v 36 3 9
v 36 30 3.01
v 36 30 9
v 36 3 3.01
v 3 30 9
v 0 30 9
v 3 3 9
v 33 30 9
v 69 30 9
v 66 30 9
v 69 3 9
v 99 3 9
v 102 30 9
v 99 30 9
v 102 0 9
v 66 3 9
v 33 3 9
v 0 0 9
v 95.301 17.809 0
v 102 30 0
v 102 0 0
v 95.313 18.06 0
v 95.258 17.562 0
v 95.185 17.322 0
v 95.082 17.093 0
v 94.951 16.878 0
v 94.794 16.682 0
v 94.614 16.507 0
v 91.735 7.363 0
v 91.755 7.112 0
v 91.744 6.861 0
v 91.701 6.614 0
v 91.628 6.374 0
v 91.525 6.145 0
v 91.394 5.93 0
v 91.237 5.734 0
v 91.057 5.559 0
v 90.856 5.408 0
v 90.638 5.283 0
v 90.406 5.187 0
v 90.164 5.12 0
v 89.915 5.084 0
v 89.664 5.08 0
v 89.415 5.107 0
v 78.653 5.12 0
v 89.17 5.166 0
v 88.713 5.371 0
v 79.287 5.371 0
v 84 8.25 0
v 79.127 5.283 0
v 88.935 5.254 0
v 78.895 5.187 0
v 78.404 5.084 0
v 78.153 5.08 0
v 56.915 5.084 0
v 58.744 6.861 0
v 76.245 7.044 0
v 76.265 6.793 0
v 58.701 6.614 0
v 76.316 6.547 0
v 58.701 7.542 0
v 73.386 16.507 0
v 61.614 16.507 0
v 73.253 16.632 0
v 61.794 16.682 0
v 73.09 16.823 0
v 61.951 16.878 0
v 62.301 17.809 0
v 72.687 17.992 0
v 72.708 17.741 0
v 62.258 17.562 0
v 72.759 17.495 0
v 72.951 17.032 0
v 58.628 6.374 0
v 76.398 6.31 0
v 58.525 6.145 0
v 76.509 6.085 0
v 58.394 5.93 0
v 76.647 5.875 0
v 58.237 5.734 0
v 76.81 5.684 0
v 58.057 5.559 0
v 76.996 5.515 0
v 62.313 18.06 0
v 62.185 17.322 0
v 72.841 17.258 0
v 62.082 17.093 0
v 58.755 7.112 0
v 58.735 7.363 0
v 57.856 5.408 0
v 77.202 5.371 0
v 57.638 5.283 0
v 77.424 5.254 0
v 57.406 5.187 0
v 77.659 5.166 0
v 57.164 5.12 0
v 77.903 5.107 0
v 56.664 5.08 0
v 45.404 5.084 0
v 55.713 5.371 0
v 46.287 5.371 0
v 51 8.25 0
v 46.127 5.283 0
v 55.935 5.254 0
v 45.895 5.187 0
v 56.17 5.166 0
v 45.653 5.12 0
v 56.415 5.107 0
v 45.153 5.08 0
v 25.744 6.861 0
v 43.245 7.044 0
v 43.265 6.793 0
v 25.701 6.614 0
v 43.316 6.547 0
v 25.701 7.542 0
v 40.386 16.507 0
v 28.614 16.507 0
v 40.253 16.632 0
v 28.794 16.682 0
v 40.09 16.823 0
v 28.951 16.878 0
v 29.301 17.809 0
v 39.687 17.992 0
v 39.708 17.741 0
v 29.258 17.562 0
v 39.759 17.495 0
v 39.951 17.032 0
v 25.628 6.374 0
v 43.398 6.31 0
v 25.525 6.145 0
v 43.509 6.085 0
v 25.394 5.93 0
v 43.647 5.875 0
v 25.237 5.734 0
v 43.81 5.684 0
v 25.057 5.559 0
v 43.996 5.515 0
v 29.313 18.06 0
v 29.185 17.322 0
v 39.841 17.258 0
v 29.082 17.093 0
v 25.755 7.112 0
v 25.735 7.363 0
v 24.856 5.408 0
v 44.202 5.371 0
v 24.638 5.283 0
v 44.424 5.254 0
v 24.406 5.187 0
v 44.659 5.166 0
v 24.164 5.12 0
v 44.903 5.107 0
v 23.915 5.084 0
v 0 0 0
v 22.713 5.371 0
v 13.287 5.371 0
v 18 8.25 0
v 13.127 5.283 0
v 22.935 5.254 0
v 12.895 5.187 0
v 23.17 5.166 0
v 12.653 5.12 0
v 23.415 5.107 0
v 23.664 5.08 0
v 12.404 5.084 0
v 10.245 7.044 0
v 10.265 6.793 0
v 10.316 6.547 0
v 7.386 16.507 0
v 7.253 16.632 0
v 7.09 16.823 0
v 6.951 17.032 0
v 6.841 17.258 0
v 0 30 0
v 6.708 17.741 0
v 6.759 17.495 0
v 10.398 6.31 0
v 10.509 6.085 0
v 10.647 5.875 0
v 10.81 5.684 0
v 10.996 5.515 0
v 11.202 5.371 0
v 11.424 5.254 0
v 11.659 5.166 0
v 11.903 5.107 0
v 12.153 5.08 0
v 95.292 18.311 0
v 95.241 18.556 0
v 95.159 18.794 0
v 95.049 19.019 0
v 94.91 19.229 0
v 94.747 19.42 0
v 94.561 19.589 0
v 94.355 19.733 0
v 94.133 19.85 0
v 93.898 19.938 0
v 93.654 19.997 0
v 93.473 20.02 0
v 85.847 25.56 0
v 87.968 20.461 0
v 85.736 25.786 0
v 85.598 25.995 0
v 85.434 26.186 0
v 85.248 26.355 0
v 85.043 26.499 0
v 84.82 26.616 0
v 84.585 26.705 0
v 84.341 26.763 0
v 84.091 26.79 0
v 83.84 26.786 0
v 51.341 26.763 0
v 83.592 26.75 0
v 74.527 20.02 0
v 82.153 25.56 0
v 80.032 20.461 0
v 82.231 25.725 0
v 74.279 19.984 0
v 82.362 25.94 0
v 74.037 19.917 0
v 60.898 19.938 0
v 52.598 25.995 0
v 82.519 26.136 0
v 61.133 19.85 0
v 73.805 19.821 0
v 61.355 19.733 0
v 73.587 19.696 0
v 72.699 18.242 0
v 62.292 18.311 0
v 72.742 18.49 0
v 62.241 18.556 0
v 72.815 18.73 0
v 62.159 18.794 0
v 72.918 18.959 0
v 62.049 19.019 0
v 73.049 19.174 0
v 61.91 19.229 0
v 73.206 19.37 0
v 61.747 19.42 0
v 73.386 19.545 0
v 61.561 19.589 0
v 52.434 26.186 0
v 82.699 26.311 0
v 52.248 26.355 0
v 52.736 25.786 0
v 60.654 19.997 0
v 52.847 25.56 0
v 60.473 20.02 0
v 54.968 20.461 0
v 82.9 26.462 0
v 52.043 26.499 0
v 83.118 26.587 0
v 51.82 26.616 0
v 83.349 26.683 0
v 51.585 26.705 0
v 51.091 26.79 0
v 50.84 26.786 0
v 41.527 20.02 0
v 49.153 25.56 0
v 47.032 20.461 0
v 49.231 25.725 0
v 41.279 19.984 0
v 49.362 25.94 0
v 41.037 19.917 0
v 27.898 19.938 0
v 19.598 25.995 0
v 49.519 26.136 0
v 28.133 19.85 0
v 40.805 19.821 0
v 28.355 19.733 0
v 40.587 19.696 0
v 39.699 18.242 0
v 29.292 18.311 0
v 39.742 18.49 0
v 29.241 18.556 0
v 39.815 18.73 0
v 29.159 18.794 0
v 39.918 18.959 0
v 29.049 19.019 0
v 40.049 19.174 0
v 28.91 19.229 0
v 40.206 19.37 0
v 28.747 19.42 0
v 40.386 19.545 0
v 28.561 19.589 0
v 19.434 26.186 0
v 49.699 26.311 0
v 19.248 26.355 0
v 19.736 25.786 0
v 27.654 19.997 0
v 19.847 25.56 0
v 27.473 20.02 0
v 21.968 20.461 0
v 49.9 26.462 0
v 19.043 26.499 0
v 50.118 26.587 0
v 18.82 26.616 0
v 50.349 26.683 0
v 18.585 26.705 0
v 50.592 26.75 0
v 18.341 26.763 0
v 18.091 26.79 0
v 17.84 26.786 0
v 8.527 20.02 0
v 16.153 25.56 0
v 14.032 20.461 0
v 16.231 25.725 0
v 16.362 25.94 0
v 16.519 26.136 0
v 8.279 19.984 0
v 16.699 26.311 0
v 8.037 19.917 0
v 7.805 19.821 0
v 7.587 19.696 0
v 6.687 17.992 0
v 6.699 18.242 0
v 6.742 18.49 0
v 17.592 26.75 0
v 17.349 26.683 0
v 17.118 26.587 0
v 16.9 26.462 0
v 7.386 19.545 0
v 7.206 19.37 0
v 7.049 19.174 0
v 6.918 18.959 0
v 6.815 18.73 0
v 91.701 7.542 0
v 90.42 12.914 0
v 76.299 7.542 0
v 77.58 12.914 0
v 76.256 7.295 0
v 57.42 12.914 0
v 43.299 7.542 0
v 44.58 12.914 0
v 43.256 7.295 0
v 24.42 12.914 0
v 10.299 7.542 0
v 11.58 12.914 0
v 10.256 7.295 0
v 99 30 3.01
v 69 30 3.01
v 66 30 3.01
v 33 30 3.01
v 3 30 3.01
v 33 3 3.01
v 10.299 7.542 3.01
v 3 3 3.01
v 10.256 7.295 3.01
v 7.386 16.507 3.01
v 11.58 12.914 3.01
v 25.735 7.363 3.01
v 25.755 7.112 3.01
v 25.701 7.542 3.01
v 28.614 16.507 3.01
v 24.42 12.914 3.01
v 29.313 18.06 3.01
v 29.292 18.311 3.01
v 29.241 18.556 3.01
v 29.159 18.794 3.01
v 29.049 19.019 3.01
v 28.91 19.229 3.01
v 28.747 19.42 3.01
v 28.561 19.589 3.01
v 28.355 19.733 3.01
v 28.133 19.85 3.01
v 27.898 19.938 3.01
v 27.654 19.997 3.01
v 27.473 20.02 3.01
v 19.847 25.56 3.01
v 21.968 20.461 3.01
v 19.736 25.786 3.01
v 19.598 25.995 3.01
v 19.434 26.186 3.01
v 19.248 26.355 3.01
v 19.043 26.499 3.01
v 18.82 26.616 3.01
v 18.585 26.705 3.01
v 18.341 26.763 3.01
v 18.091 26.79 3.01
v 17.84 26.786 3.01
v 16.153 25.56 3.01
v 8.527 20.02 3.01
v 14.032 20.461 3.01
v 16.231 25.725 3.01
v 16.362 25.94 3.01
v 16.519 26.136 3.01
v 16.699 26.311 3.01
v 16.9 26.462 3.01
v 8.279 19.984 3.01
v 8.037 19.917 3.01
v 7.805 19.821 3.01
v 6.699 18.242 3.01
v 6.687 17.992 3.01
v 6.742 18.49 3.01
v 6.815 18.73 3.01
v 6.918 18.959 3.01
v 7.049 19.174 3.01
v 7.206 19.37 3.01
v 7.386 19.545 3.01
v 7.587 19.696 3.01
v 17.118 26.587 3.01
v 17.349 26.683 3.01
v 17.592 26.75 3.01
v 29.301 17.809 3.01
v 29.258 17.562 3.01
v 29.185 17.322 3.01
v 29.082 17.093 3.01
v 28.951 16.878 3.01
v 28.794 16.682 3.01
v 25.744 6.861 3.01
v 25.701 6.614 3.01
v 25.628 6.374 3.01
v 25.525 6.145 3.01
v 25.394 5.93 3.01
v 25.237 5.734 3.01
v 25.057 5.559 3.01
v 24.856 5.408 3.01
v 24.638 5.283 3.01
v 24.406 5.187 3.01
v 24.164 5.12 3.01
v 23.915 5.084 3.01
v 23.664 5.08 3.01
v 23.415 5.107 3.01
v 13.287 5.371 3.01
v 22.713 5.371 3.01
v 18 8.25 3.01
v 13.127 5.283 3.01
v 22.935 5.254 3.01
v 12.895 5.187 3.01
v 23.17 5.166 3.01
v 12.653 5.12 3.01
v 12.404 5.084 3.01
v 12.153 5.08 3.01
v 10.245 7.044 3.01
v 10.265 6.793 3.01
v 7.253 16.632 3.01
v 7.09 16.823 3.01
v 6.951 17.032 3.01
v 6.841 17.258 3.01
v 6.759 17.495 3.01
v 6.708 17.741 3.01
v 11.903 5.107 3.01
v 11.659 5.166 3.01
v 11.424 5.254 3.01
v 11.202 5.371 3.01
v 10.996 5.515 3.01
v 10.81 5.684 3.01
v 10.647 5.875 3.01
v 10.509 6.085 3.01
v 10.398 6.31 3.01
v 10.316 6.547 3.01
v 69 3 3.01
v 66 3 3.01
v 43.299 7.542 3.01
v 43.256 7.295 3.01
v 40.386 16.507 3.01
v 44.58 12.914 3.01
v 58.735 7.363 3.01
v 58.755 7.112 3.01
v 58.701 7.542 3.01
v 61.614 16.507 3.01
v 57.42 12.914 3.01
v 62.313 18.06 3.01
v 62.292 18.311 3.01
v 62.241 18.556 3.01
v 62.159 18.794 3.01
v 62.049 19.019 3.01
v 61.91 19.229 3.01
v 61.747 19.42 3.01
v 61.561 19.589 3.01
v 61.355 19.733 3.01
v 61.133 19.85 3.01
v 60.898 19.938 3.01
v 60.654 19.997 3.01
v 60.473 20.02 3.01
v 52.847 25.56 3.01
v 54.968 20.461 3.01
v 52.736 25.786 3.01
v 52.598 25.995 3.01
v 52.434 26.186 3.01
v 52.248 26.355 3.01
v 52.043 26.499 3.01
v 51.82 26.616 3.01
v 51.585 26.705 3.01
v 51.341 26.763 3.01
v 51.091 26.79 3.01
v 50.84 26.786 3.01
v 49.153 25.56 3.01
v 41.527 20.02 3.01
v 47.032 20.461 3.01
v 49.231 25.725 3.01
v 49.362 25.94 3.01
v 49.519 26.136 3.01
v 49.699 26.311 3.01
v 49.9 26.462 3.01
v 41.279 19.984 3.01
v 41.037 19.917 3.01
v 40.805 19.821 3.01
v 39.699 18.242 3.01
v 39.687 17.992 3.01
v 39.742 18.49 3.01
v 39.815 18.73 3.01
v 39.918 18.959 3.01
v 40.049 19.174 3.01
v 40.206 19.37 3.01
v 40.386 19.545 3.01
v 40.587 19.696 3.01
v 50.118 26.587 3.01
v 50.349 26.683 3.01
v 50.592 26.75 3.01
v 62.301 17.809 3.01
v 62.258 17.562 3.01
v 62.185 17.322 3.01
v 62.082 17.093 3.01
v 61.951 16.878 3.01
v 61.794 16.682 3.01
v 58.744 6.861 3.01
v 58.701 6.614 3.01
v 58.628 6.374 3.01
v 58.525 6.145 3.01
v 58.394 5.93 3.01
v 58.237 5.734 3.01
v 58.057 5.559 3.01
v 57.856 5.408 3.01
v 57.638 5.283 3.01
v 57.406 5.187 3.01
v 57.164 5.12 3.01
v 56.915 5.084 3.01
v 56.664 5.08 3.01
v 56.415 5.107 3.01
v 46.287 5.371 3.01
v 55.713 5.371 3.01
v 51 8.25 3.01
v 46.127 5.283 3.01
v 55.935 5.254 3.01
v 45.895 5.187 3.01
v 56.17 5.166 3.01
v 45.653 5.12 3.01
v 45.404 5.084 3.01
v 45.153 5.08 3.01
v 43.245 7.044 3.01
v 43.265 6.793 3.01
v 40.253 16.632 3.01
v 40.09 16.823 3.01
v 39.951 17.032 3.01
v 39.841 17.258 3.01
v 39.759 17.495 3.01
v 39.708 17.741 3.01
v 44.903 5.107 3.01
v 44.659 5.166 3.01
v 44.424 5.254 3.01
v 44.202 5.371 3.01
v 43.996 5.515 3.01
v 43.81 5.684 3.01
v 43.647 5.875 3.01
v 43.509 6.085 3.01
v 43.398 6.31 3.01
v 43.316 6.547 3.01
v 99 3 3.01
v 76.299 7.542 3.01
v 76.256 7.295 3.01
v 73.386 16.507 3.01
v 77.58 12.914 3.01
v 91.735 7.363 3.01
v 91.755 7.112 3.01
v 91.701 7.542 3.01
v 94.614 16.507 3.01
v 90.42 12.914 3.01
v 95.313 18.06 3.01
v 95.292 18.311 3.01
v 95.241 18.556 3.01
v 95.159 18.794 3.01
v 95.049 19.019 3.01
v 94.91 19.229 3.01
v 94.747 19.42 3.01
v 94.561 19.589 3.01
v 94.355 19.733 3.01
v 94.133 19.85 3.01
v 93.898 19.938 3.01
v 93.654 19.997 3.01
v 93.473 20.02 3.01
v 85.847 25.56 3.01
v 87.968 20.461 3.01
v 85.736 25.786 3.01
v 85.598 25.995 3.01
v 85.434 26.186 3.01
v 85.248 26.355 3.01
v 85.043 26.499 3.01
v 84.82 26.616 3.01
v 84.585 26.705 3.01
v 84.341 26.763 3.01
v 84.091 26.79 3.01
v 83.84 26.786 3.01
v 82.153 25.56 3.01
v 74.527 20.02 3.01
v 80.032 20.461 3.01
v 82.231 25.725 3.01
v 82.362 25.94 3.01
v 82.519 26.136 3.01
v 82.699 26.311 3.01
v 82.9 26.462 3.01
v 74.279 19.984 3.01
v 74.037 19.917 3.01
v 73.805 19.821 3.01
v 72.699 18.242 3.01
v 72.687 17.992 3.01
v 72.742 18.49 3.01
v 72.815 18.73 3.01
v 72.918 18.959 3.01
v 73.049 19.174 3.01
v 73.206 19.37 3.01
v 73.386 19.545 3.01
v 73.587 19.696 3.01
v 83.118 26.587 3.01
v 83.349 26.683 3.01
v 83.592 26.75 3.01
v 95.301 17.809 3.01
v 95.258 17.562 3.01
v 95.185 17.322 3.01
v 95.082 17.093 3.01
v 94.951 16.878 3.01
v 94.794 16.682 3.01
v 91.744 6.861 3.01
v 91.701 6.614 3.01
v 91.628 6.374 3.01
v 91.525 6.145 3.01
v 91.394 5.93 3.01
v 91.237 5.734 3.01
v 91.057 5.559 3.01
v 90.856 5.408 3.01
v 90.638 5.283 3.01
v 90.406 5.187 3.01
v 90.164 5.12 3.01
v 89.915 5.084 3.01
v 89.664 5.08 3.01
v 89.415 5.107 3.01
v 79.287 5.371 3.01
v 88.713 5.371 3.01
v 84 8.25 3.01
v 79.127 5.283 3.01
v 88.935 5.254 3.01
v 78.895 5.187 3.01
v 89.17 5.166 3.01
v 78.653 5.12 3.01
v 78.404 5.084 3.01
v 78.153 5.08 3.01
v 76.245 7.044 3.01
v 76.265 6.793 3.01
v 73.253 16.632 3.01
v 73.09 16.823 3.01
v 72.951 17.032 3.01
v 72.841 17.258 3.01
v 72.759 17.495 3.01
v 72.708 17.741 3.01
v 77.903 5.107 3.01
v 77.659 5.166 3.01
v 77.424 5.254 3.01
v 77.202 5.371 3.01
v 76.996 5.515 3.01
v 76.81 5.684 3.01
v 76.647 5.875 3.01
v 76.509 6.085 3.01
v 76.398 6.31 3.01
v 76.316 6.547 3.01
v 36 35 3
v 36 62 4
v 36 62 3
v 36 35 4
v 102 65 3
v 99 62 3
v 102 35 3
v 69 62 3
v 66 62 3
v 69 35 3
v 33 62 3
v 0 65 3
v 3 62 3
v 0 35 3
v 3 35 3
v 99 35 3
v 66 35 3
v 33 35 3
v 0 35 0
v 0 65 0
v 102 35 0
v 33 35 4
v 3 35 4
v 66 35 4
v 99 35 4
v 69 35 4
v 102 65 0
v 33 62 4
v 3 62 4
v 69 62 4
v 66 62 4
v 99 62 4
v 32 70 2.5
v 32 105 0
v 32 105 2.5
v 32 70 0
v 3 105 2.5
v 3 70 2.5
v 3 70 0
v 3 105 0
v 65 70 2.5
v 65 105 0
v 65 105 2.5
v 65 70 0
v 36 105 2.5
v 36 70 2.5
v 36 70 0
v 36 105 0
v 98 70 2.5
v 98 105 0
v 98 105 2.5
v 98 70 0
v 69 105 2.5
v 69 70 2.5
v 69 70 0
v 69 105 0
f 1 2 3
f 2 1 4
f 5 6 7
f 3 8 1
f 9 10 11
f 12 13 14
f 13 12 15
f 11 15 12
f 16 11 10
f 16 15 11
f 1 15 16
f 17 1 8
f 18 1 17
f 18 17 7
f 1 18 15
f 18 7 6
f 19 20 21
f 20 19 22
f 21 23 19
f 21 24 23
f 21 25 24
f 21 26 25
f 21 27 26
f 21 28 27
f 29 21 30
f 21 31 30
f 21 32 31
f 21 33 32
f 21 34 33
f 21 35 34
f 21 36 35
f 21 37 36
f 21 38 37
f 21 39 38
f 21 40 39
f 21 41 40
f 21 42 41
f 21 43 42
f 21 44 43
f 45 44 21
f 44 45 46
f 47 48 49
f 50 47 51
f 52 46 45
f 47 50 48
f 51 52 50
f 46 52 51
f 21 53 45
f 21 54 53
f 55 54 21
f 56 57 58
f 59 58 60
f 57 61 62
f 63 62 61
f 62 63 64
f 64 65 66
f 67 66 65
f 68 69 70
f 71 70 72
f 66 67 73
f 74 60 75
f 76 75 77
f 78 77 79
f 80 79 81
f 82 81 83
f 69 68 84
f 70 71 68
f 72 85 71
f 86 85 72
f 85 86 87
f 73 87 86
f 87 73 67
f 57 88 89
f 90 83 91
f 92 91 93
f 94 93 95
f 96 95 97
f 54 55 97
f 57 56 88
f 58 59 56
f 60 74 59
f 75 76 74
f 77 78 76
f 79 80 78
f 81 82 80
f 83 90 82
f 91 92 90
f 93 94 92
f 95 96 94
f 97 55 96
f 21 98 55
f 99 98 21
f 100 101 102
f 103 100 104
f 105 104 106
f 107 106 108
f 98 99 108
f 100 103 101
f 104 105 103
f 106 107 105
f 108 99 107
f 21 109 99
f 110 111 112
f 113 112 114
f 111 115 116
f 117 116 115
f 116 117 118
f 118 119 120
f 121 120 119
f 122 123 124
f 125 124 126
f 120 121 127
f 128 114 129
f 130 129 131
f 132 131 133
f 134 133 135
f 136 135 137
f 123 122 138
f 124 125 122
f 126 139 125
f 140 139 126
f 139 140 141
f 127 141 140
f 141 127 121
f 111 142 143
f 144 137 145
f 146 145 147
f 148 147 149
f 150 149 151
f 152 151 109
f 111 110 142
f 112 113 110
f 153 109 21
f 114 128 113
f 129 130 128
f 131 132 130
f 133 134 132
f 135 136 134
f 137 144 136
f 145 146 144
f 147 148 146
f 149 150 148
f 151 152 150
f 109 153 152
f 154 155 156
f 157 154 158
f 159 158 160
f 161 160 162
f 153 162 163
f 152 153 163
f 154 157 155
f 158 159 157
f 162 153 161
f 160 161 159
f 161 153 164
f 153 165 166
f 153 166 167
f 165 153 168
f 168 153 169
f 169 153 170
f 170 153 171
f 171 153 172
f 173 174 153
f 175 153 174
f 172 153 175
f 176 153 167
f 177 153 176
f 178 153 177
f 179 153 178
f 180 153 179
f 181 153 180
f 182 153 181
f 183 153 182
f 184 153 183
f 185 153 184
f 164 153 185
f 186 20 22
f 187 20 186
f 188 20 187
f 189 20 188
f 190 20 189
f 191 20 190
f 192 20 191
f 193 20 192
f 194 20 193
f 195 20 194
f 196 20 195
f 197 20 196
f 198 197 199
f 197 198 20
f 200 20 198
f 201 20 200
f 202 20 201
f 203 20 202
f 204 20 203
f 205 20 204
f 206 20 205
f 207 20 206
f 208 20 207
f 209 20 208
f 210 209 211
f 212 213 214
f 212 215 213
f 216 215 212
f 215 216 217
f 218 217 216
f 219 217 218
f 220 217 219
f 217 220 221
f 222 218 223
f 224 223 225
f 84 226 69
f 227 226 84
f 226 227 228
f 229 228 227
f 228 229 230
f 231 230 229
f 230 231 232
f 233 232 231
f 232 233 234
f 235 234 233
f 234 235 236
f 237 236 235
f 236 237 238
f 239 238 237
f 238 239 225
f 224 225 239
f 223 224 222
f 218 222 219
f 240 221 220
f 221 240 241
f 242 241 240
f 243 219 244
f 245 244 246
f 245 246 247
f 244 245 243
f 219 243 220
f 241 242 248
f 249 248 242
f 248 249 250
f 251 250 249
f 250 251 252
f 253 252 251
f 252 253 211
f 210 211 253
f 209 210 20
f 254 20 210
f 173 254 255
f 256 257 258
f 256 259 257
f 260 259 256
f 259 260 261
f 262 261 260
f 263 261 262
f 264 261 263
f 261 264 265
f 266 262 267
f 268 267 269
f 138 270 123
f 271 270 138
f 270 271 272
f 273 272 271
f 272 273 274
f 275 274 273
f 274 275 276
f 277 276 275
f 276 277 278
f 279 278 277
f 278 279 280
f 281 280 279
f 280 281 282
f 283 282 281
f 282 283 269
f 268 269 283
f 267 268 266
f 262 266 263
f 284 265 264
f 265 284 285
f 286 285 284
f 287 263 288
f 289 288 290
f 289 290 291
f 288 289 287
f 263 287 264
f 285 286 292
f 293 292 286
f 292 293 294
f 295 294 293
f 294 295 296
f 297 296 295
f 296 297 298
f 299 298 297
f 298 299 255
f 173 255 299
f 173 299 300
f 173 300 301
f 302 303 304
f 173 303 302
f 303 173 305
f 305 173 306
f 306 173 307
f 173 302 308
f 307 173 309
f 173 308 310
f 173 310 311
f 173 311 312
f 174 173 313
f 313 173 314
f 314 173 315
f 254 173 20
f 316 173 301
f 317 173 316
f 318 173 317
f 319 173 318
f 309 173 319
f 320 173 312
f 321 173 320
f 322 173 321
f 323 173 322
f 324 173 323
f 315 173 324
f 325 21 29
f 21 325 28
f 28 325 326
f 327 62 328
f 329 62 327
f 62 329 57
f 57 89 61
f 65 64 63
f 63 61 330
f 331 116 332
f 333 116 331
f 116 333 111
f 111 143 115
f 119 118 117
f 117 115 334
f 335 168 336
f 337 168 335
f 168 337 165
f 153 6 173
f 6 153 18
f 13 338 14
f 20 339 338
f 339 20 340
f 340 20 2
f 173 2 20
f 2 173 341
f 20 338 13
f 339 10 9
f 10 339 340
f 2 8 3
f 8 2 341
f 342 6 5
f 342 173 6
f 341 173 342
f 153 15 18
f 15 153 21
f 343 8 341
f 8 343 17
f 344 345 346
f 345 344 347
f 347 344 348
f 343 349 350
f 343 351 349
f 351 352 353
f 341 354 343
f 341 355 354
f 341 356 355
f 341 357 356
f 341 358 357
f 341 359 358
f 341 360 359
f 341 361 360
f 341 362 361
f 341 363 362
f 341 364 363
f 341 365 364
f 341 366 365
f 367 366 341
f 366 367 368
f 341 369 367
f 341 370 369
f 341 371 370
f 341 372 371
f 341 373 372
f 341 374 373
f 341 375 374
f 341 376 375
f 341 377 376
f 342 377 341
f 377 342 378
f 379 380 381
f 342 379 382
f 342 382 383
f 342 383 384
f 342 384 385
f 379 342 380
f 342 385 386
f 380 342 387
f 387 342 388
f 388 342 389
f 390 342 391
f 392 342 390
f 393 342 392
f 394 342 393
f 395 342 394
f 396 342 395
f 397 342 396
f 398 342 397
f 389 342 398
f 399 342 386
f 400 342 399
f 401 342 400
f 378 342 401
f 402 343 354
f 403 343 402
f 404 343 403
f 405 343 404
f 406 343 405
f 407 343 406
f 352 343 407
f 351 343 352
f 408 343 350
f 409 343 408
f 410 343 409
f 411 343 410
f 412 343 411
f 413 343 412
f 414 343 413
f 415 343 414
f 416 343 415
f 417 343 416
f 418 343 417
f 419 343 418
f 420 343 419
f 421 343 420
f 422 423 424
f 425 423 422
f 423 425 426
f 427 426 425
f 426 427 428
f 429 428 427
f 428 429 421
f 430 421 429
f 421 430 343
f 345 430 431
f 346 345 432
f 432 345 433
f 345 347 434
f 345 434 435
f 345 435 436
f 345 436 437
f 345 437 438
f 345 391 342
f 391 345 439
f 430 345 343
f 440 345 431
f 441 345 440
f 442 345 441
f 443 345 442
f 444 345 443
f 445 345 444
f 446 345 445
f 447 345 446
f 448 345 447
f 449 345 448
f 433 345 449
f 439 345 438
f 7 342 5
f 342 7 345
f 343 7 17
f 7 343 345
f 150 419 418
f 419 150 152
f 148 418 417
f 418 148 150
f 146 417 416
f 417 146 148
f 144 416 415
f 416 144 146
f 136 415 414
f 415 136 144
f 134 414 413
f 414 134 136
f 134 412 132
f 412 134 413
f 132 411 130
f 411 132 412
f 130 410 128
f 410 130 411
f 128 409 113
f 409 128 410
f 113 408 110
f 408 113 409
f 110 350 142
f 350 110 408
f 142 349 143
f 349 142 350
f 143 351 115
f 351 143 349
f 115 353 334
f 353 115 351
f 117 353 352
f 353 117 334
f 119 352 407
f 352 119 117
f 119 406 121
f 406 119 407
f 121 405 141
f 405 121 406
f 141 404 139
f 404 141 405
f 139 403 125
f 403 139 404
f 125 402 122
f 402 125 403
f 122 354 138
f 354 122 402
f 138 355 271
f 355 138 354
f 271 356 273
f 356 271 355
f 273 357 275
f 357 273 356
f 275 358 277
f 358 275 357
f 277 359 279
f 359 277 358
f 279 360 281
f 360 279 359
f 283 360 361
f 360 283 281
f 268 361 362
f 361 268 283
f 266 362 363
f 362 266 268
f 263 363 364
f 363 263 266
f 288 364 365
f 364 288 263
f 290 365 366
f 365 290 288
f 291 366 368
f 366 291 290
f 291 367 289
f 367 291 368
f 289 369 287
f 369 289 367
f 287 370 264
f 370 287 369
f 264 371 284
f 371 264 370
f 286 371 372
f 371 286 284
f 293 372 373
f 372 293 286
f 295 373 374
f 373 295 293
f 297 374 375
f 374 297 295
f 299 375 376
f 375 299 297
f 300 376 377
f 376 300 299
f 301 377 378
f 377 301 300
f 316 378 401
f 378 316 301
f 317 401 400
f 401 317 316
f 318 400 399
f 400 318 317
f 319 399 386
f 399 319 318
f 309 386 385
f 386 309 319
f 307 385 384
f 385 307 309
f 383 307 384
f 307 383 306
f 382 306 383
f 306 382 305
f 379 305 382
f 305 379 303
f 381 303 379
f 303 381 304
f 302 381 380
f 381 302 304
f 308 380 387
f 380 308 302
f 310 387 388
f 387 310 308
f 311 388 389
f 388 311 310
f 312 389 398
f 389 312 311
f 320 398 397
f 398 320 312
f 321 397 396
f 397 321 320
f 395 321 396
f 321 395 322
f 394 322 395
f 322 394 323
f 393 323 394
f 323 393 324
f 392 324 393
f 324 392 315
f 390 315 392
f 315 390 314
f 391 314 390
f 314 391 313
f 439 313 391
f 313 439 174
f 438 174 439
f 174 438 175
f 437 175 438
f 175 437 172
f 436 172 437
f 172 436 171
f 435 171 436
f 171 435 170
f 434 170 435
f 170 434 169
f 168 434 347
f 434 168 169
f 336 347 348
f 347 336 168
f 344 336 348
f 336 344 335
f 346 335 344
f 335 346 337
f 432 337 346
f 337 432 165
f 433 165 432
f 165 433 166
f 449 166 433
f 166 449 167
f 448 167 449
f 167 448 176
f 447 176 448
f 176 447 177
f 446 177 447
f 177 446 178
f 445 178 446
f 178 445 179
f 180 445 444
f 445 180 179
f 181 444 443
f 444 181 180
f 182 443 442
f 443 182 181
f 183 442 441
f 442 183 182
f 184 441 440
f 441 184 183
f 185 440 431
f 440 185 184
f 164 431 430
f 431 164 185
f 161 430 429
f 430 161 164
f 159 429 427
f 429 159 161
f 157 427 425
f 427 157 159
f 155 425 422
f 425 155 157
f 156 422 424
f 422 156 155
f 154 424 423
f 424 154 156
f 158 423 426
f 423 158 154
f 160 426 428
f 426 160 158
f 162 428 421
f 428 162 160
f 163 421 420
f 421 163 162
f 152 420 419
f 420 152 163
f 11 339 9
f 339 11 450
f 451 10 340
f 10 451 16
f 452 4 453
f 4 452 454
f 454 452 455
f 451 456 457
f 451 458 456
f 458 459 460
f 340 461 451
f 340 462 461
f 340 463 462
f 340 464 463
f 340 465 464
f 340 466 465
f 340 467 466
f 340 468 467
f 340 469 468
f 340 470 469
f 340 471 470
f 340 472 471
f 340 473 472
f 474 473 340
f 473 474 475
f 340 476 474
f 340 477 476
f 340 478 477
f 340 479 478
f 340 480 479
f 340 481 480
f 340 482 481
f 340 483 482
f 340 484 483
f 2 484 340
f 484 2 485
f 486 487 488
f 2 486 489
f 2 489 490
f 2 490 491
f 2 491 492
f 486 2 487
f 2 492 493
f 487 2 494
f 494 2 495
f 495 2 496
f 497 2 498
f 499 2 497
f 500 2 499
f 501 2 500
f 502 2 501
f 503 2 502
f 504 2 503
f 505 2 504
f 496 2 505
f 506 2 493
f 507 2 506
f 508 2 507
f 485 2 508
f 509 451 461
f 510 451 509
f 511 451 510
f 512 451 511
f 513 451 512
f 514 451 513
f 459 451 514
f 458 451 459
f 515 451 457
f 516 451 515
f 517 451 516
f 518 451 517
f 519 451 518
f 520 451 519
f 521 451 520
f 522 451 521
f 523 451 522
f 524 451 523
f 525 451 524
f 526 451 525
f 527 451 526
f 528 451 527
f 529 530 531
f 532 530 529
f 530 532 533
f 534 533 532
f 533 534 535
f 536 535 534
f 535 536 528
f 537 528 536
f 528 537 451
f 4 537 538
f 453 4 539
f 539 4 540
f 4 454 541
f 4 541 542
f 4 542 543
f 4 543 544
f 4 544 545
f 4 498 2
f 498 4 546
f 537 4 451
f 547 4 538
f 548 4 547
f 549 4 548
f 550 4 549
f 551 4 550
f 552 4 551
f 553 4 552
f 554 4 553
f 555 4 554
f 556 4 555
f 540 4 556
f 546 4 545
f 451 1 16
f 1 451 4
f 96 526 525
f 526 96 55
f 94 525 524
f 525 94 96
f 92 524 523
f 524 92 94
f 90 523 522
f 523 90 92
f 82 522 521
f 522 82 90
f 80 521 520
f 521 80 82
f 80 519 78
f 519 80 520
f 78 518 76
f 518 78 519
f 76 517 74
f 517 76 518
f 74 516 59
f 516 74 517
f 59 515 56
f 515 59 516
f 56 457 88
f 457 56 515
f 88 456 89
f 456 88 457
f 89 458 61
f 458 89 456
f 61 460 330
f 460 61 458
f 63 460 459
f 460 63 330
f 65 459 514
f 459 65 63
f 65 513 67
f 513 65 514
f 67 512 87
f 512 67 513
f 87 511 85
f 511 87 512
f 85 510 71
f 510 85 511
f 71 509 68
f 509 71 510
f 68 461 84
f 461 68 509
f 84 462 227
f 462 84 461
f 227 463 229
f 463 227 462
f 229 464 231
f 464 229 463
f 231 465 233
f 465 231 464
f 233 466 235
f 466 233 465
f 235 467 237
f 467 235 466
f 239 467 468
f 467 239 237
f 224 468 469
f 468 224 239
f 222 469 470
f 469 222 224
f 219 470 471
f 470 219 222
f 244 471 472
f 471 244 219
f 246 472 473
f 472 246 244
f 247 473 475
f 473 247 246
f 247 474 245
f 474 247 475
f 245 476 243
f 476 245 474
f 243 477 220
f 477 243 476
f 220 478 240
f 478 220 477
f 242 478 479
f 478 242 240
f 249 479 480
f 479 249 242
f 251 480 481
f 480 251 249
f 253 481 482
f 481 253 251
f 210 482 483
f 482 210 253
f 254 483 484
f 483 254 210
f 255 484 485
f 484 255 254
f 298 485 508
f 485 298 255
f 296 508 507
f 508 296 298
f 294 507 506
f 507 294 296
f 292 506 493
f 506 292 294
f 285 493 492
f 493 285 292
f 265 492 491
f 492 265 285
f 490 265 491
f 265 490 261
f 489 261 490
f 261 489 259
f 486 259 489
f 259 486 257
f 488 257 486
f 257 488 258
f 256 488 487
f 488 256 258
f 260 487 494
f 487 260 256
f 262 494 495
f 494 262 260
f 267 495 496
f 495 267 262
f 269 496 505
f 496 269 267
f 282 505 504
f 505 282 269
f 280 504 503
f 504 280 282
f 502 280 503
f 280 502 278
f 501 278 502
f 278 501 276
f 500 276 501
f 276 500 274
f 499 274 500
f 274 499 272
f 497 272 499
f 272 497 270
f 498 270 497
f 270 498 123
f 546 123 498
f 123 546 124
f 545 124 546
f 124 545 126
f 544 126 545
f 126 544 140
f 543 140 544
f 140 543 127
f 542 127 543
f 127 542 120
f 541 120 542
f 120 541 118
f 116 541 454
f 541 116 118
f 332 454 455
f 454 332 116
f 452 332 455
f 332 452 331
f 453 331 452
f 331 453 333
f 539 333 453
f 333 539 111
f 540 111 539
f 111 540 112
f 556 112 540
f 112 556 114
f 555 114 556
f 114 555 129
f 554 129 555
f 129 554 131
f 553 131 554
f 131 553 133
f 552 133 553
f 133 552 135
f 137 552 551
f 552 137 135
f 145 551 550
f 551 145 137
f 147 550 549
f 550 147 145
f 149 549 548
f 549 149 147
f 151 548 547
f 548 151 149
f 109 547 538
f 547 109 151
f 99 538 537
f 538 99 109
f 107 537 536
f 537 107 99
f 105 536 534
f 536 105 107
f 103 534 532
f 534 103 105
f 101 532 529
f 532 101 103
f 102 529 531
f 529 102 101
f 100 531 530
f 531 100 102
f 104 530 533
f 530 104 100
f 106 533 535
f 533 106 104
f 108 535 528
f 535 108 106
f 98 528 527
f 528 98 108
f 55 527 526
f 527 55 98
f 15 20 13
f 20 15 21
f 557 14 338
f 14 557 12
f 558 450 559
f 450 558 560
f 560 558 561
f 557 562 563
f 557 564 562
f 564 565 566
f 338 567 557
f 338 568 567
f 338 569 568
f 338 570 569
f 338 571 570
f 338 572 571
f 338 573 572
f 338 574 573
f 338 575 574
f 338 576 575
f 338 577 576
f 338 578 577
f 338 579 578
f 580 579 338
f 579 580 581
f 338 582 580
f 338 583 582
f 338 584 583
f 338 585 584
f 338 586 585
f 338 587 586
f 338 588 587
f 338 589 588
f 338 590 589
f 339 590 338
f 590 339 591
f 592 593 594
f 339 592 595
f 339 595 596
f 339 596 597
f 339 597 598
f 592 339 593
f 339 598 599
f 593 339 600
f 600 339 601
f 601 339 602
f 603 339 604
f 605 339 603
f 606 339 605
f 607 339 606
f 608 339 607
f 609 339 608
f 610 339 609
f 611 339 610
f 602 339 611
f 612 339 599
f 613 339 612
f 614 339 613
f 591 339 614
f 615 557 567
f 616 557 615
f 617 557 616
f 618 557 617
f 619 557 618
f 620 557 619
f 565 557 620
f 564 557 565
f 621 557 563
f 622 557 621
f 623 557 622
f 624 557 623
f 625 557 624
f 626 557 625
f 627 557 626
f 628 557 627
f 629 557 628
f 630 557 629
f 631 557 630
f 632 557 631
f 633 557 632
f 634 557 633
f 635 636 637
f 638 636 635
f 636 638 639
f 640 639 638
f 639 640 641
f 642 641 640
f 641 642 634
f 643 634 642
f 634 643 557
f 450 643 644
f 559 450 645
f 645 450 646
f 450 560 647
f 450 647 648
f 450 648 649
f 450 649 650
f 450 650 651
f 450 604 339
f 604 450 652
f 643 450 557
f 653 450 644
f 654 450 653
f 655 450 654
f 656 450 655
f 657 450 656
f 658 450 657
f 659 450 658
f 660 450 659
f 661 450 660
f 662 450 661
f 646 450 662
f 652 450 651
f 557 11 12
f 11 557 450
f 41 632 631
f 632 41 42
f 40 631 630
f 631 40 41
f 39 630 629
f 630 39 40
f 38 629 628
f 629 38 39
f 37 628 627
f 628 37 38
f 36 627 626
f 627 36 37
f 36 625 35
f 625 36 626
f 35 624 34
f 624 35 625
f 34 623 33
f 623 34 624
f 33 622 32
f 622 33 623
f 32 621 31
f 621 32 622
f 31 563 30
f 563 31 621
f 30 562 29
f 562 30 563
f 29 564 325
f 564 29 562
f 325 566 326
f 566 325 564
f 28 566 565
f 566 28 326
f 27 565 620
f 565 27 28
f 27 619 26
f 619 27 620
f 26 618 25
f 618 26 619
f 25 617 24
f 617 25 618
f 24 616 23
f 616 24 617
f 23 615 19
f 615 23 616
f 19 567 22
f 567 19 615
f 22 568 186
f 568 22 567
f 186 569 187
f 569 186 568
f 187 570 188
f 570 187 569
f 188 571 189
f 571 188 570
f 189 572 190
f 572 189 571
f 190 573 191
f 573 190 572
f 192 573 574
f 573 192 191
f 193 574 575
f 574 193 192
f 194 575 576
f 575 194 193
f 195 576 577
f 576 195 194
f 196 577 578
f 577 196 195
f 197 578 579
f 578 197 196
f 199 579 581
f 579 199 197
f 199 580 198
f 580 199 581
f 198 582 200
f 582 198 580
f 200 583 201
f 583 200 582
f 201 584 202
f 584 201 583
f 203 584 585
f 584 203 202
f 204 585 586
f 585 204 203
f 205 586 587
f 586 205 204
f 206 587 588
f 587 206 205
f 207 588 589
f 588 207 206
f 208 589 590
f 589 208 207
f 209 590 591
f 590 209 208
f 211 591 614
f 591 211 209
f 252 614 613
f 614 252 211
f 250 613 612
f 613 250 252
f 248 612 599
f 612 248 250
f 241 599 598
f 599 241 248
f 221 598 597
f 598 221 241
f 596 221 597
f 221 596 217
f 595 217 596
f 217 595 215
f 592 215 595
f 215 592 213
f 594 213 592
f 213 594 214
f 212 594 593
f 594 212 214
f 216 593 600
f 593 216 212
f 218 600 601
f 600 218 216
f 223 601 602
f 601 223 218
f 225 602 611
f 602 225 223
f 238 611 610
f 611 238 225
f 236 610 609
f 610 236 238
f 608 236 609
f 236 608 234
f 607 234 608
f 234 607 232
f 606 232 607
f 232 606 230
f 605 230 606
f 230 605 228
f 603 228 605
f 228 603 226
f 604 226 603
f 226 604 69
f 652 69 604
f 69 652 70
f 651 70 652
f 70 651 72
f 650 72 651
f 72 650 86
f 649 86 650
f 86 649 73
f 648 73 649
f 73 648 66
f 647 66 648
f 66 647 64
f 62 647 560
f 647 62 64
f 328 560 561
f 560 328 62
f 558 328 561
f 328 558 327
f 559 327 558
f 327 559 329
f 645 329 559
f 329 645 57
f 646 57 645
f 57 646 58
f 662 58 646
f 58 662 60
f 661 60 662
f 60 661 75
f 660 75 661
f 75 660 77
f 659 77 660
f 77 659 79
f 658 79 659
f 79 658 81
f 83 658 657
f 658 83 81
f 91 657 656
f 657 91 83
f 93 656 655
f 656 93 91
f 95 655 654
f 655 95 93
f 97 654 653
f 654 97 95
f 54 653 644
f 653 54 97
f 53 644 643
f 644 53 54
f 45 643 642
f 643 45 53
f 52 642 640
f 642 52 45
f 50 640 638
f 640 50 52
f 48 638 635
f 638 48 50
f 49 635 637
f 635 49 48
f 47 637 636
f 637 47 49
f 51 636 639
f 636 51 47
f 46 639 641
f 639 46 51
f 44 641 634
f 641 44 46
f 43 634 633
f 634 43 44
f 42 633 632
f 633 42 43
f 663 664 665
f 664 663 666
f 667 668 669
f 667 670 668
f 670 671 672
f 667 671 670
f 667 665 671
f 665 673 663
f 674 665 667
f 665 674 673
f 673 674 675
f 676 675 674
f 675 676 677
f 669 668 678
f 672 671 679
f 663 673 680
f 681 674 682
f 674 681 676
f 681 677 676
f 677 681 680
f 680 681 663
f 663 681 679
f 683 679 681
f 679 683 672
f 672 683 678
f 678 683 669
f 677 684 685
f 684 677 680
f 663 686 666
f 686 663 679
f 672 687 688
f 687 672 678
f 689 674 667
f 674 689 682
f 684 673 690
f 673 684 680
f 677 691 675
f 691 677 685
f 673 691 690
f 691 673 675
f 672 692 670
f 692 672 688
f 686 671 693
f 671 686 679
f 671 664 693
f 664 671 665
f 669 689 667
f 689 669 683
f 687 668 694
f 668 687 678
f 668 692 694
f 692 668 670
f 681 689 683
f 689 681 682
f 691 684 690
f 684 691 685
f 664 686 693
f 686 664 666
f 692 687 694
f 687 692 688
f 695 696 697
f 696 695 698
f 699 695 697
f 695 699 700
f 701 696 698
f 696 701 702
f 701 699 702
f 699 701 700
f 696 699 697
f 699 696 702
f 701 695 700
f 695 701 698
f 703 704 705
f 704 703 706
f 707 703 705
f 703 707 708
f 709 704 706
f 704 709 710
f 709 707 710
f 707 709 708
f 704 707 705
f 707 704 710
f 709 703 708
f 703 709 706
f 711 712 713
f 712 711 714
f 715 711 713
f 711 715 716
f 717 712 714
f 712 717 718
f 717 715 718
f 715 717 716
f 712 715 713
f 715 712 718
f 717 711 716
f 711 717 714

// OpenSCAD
// ---------------------------------------------------------------------------
//  Star Activity Tracker
//
//  Model page: https://www.printables.com/model/1854921-star-activity-tracker
//
//  All dimensions are in millimetres.
//
// ---------------------------------------------------------------------------

// ---------------------------------------------------------------------------
//  Quality
// ---------------------------------------------------------------------------

$fn = 50;

// ---------------------------------------------------------------------------
//  Parameters
// ---------------------------------------------------------------------------

// Token
token_width = 30;   // square footprint of a token window
token_height = 35;  // token length; taller than the window so it can be gripped
token_depth = 6;    // window cavity depth
inset = 1;          // clearance shaved from token and cavity edges

// Case
thickness = 3;      // window floor and rear panel thickness
spacing = 3;        // gap between windows, also the width of a window's frame wall
tokens = 3;         // number of windows in the case

// Layout
eps = 0.01;          // fudge factor for clean boolean cuts
panel_clearance = 5; // gap between the window row and the rear panel
case_or_token = "case";

// Window star cut-out
star_points = 5;
star_corner_radius = 2; // softens the star's points
star_cut_height = 100;  // tall enough to punch through anything it meets

// ---------------------------------------------------------------------------
//  Derived dimensions
// ---------------------------------------------------------------------------

column_pitch = token_width + spacing;
case_length = tokens * column_pitch + spacing; // window row and panel width

// ---------------------------------------------------------------------------
//  Star
// ---------------------------------------------------------------------------

// An n-pointed star with rounded corners, extruded to height z
module rounded_star(x = 50, y = 50, z = 5, points = 5, rounding = 1, inner_ratio = 0.45) {
    linear_extrude(height = z)
        offset(r = rounding)
            offset(delta = -rounding)
                polygon([
                    for (i = [0 : 2 * points - 1])
                        let (
                            angle = 90 + i * 180 / points,
                            radius = (i % 2 == 0) ? 1 : inner_ratio
                        )
                            [
                                (x / 2) * radius * cos(angle),
                                (y / 2) * radius * sin(angle)
                            ]
                ]);
}

// ---------------------------------------------------------------------------
//  Token window
// ---------------------------------------------------------------------------

module window(x_offset) {
    translate([x_offset, 0, 0])
        difference() {
            cube([token_width + 2 * spacing, token_width, token_depth + thickness]);

            translate([spacing, thickness, thickness + eps])
                cube([token_width, token_width + eps, token_depth]);

            translate([spacing + token_width / 2, token_width / 2, -eps])
                rounded_star(token_width, token_width, star_cut_height, star_points, star_corner_radius);
        }
}

// One window per token, pitched along x.
module windows() {
    for (i = [0 : tokens - 1])
        window(i * column_pitch);
}

// ---------------------------------------------------------------------------
//  Rear panel
// ---------------------------------------------------------------------------

// A flat panel sitting `panel_clearance` behind the window row. The token
// windows are subtracted from it, leaving shallow notches on its inner face
// where the window frames land.
module rear_panel() {
    translate([0, 2 * token_width + panel_clearance, 2 * token_depth])
        rotate([180, 0, 0])
            difference() {
                translate([0, 0, thickness + token_depth - inset])
                    cube([case_length, token_width, thickness + inset]);

                windows();
            }
}

// ---------------------------------------------------------------------------
//  Tokens
// ---------------------------------------------------------------------------

module blank_tokens() {
    for (i = [0 : tokens - 1])
        translate([i * column_pitch + spacing, 2 * token_width + 2 * panel_clearance, 0])
            cube([token_width - inset, token_height, (token_depth - inset) / 2]);
}

module highlighted_token() {
    cube([token_width - inset, token_height, (token_depth - inset) / 3]);
}

// ---------------------------------------------------------------------------
//  Top level
// ---------------------------------------------------------------------------

assert(tokens >= 1, "tokens must be 1 or more");
assert(
    case_or_token == "case" || case_or_token == "token",
    "case_or_token must be \"case\" or \"token\""
);

if (case_or_token == "case") {
    windows();
    rear_panel();
    blank_tokens();
} else {
    highlighted_token();
}
